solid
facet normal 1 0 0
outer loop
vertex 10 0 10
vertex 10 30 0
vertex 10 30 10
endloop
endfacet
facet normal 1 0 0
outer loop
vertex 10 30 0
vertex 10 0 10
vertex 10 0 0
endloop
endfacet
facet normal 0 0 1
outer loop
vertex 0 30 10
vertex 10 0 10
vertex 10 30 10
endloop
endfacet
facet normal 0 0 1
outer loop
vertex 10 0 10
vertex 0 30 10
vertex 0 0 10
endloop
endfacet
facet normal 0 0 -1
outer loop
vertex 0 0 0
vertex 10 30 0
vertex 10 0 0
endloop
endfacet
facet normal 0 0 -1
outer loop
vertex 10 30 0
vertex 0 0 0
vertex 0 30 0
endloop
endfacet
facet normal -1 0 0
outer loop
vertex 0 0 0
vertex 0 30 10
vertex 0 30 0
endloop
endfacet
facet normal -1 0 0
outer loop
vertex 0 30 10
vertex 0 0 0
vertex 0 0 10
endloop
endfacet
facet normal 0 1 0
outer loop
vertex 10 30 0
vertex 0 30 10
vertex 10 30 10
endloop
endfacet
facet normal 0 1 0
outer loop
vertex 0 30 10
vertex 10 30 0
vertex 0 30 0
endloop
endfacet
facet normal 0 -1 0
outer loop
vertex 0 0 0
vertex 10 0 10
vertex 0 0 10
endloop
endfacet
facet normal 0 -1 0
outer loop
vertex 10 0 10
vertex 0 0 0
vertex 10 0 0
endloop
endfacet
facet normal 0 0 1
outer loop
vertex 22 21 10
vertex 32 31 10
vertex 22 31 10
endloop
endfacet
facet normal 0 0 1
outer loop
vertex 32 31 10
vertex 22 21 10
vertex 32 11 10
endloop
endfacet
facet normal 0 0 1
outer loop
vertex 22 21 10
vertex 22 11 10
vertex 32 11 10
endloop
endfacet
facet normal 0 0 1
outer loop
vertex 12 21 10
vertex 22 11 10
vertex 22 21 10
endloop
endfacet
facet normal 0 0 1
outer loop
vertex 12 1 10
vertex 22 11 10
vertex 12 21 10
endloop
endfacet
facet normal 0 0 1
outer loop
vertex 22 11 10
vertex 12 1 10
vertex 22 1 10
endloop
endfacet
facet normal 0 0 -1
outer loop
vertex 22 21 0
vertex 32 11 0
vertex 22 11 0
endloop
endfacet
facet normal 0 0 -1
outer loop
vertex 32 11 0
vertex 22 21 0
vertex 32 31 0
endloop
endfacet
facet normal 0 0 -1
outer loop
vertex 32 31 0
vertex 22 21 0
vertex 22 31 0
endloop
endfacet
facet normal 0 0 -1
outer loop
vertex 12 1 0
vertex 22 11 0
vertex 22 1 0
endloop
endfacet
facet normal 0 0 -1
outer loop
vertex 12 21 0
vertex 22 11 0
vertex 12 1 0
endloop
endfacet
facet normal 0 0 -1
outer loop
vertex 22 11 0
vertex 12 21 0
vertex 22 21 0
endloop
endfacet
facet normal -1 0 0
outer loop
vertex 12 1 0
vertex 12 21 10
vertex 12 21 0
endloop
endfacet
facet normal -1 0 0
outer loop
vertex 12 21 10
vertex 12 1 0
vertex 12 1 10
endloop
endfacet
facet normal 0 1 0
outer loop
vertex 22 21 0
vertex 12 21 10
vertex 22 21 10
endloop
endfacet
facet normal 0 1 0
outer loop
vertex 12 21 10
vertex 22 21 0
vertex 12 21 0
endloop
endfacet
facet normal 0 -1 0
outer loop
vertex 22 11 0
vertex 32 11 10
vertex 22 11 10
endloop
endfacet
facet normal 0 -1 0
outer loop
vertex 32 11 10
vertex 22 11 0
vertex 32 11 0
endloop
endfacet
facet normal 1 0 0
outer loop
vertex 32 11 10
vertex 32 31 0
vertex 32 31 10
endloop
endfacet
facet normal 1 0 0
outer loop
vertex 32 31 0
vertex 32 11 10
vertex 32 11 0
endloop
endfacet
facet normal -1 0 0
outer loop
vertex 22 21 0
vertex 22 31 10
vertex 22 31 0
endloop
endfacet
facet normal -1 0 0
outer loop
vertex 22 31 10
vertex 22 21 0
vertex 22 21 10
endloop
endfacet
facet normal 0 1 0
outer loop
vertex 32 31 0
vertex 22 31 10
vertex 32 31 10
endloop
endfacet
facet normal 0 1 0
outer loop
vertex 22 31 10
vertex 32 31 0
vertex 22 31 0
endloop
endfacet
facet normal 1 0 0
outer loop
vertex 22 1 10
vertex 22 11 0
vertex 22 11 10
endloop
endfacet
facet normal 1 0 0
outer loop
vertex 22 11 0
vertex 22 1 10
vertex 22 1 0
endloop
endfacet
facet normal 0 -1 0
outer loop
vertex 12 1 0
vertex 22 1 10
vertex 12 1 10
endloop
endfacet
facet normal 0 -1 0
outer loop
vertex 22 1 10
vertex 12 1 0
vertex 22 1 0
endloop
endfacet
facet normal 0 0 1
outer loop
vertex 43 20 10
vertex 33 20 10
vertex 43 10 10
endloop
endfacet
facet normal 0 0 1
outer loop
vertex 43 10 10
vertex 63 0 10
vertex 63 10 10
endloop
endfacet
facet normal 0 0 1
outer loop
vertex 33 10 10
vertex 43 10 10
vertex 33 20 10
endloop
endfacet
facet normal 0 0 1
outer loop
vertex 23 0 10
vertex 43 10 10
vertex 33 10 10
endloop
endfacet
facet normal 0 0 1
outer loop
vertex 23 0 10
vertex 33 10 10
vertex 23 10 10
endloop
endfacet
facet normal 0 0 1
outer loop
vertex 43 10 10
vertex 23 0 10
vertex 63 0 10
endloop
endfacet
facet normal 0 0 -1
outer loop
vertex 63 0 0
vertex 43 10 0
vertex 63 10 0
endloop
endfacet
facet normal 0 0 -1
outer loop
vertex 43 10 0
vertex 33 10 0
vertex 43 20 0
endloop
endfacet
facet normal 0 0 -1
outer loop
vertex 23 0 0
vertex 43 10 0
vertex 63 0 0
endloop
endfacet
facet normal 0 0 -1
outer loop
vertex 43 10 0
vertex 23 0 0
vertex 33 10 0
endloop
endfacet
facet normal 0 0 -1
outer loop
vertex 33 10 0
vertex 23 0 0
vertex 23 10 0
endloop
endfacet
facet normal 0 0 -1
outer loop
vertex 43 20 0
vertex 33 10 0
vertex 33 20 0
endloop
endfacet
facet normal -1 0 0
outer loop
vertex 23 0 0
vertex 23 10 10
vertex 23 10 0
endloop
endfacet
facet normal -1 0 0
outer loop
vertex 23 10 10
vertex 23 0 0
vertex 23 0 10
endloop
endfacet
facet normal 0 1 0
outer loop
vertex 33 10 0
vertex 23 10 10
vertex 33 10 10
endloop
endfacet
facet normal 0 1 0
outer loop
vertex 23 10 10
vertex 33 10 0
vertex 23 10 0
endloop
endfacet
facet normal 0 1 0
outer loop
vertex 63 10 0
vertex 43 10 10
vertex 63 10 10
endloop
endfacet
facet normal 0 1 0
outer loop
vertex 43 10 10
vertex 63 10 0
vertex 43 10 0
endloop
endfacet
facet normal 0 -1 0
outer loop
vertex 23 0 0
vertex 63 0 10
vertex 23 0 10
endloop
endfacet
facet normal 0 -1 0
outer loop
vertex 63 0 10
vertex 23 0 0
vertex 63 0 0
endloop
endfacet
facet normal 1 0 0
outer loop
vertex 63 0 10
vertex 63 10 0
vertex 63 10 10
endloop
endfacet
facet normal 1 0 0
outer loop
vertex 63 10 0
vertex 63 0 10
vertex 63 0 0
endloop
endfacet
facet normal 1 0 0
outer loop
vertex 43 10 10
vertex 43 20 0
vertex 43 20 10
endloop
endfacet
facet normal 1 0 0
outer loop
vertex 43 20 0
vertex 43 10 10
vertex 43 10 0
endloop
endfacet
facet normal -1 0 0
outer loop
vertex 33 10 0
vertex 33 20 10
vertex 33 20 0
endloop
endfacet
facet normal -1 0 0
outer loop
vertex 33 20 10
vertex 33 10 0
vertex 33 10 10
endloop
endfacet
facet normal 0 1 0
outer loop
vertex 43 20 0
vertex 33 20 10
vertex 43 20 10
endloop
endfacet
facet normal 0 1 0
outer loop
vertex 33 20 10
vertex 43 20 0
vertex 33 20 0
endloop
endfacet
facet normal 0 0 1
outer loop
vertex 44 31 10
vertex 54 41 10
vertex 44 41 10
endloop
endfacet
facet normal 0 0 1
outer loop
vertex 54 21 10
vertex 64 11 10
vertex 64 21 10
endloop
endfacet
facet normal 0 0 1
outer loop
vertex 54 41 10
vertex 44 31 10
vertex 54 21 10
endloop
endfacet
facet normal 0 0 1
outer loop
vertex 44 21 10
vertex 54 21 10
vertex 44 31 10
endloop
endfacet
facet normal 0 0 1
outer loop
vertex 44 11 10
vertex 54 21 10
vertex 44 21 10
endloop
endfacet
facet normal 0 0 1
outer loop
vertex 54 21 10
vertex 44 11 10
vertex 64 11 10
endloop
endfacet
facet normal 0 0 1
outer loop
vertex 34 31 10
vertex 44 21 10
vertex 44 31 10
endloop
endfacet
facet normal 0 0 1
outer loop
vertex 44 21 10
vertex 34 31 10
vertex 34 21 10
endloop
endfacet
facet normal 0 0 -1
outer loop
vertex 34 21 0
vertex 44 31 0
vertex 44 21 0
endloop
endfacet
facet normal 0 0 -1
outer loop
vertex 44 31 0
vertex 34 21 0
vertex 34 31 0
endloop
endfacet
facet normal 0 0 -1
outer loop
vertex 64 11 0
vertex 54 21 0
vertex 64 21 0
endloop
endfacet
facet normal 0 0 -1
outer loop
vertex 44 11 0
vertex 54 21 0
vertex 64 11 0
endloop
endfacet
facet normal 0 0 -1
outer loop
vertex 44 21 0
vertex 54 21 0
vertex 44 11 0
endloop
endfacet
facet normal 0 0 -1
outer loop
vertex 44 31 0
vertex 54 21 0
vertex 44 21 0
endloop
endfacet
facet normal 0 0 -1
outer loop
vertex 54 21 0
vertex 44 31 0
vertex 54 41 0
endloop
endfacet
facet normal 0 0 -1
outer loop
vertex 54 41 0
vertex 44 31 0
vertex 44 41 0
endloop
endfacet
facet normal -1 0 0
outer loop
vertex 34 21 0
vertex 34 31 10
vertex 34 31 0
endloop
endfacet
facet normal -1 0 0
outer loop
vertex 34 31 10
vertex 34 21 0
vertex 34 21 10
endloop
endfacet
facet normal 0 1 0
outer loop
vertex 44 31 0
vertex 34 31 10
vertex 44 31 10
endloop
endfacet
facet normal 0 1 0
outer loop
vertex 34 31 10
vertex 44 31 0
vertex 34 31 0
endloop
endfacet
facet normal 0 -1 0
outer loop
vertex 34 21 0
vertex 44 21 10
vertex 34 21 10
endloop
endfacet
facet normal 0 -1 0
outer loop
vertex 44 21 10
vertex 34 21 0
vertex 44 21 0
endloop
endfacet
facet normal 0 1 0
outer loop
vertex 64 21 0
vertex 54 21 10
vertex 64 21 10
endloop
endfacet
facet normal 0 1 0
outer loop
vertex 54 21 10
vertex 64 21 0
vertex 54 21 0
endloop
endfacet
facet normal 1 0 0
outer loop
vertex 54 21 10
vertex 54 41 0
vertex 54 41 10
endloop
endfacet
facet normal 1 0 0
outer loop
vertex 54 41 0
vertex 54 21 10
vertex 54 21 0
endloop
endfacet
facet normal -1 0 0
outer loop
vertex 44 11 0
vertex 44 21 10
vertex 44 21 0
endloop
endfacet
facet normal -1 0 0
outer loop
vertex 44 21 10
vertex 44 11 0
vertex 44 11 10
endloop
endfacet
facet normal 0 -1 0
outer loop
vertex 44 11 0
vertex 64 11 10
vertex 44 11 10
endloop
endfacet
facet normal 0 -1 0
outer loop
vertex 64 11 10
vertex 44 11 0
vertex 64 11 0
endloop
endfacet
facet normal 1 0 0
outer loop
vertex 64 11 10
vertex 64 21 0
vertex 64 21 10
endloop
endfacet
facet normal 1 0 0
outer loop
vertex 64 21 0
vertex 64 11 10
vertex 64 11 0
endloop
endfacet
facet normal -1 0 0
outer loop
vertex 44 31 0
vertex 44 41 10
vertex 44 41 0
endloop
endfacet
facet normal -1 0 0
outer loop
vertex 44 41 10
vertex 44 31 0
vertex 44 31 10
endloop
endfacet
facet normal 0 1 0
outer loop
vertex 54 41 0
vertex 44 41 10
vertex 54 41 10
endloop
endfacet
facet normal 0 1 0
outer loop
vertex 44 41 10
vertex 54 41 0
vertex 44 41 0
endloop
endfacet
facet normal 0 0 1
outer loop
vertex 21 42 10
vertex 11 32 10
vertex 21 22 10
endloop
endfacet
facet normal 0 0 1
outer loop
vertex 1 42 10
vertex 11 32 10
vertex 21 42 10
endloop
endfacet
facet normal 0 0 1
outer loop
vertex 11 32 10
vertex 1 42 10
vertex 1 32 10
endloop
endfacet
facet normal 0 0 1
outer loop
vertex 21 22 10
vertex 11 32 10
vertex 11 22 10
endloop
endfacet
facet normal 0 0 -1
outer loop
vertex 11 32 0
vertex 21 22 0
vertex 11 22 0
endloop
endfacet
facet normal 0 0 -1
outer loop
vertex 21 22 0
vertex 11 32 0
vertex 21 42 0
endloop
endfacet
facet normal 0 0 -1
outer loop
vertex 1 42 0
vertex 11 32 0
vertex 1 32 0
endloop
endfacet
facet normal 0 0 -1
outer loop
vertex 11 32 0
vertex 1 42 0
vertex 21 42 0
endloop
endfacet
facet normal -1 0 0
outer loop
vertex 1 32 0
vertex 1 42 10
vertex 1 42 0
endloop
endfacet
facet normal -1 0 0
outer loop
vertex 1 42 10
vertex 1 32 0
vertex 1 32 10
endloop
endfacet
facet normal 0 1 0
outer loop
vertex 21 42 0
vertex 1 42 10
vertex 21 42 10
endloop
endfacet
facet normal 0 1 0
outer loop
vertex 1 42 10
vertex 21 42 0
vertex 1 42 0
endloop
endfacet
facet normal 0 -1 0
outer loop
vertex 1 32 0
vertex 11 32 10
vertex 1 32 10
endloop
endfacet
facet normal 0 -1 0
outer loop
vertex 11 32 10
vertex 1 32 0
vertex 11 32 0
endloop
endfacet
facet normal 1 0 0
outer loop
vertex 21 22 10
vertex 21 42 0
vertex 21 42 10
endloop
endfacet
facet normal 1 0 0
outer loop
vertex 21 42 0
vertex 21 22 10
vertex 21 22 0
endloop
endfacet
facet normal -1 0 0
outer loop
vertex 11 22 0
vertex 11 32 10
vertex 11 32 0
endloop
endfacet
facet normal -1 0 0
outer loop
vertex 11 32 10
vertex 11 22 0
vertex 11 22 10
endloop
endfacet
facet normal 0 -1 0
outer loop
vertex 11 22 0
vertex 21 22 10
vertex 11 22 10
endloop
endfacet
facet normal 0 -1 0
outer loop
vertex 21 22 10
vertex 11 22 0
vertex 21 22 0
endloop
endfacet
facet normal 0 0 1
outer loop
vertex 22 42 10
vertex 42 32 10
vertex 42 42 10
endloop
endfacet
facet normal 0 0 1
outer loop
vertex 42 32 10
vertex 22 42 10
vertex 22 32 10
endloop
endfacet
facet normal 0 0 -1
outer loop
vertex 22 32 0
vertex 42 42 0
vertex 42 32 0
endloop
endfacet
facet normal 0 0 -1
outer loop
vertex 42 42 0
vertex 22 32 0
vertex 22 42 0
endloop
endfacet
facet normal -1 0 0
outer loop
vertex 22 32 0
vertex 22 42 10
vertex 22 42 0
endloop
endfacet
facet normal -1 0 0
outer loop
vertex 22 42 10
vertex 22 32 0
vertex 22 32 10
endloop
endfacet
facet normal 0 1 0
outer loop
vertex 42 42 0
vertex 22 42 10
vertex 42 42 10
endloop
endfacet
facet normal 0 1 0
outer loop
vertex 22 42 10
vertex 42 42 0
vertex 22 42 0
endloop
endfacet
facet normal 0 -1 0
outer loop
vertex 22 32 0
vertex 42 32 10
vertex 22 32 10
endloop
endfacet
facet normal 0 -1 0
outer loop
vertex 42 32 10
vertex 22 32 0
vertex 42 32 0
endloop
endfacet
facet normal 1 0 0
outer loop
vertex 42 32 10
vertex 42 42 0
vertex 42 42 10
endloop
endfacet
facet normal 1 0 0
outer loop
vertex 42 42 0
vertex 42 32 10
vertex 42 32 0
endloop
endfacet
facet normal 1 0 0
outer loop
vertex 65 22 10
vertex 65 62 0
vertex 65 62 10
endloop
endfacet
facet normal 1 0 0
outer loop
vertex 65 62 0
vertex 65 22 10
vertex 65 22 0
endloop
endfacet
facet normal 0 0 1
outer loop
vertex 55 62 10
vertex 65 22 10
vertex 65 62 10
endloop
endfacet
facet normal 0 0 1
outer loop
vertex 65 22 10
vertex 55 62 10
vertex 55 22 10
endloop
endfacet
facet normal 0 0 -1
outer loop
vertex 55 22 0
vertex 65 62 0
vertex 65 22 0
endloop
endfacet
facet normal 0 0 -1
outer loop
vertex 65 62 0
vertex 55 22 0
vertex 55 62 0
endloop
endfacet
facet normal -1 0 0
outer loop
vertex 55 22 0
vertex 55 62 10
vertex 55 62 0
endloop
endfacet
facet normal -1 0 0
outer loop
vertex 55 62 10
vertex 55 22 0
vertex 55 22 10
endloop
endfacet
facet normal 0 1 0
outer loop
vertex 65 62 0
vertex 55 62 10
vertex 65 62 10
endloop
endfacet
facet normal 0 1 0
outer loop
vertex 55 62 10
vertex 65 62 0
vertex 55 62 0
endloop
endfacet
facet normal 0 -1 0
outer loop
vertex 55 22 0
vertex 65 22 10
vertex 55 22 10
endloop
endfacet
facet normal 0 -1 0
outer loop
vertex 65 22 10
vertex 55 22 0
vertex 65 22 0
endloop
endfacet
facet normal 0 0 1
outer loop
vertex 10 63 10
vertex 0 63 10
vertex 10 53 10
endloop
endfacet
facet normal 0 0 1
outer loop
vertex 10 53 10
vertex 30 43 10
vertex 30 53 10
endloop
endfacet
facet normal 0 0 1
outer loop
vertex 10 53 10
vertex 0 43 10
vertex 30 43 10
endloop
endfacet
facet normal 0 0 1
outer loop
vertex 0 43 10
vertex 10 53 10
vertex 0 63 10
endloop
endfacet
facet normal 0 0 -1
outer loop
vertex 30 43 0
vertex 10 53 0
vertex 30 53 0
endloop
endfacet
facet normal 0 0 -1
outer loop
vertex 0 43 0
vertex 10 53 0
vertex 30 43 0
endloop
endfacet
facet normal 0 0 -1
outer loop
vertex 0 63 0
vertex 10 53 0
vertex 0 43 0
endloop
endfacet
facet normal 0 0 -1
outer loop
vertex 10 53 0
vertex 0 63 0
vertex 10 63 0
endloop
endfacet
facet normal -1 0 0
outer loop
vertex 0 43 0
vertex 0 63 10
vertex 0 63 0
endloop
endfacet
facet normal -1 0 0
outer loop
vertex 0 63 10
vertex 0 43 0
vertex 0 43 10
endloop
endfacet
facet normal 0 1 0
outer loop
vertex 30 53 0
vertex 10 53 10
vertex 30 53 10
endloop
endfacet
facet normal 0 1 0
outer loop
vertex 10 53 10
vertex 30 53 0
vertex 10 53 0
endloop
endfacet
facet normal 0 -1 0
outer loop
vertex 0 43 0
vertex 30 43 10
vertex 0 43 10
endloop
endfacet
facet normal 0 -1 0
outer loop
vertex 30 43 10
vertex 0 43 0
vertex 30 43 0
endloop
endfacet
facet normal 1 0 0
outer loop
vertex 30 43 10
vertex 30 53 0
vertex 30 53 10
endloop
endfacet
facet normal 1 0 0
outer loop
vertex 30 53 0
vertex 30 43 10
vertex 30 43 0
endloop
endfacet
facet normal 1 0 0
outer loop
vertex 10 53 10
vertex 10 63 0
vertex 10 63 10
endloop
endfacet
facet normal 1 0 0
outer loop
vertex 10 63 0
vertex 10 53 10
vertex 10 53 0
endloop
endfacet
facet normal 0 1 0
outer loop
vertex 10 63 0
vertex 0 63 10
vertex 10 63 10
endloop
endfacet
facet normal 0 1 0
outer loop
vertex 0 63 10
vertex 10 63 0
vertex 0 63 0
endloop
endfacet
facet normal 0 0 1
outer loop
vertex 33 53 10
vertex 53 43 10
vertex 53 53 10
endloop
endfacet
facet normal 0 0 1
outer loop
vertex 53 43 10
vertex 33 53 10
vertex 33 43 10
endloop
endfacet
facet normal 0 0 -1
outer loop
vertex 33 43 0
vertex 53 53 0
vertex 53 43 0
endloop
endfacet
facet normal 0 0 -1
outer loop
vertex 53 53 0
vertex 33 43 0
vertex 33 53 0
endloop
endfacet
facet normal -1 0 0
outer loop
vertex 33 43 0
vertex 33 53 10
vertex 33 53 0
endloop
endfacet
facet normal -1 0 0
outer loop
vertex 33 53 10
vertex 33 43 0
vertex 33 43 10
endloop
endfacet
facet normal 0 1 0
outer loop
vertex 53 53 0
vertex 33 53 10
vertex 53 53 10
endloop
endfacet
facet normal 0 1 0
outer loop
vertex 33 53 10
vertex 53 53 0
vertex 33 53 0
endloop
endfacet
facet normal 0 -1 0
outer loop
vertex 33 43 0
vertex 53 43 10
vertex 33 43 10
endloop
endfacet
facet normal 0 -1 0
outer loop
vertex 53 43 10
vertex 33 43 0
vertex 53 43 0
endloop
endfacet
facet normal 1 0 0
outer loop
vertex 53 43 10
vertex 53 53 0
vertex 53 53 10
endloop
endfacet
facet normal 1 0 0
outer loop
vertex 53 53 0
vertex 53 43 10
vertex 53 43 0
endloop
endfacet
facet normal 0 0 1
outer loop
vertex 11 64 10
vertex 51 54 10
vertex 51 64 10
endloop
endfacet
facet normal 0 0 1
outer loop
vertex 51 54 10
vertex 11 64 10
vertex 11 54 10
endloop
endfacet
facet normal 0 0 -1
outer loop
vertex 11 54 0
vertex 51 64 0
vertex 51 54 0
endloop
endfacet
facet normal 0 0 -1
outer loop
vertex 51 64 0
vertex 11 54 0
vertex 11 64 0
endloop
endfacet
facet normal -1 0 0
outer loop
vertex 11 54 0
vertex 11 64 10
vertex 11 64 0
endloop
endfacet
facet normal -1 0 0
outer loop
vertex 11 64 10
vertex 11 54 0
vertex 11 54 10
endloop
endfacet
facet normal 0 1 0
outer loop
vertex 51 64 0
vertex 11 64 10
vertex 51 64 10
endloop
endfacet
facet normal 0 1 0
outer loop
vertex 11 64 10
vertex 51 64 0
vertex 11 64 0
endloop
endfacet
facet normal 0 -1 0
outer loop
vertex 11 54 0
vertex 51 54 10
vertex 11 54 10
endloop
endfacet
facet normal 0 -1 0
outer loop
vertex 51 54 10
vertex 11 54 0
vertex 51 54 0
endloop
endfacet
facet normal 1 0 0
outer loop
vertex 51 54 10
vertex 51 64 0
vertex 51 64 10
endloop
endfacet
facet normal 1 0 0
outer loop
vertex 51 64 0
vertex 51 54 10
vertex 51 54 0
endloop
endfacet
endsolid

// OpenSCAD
side = 10;

module block(shape)
{
    echo(len(shape));
    for(i = [0:len(shape)-1])
    {
        for(j = [0:len(shape[i])-1])
        {
            if(shape[i][j] == 1)
            {
                translate([(j)*side,(len(shape)-1-i)*side,0])
                cube([side,side,side]);
            }
        }
        
    }
}

block([[1],[1],[1]]);

translate([1*(side+1)+1,1,0])
block([[0,1],
       [1,1],
       [1,0]]);

translate([2*(side+1)+1,0,0])
block([[0,1,0,0],
       [1,1,1,1]]);

translate([3*(side+1)+1,1*(side+1),0])
block([[0,1,0],
       [1,1,0],
       [0,1,1]]);

translate([0*(side+1)+1,2*(side+1),0])
block([[1,1],
       [0,1]]);

translate([2*(side+1),3*(side+1)-1,0])
block([[1,1]]);

translate([5*(side+1),2*(side+1),0])
block([[1],[1],[1],[1]]);

translate([0*(side+1),4*(side+1)-1,0])
block([[1,0,0],
       [1,1,1]]);

translate([3*(side+1),4*(side+1)-1,0])
block([[1,1]]);

translate([1*(side+1),5*(side+1)-1,0])
block([[1,1,1,1]]);
